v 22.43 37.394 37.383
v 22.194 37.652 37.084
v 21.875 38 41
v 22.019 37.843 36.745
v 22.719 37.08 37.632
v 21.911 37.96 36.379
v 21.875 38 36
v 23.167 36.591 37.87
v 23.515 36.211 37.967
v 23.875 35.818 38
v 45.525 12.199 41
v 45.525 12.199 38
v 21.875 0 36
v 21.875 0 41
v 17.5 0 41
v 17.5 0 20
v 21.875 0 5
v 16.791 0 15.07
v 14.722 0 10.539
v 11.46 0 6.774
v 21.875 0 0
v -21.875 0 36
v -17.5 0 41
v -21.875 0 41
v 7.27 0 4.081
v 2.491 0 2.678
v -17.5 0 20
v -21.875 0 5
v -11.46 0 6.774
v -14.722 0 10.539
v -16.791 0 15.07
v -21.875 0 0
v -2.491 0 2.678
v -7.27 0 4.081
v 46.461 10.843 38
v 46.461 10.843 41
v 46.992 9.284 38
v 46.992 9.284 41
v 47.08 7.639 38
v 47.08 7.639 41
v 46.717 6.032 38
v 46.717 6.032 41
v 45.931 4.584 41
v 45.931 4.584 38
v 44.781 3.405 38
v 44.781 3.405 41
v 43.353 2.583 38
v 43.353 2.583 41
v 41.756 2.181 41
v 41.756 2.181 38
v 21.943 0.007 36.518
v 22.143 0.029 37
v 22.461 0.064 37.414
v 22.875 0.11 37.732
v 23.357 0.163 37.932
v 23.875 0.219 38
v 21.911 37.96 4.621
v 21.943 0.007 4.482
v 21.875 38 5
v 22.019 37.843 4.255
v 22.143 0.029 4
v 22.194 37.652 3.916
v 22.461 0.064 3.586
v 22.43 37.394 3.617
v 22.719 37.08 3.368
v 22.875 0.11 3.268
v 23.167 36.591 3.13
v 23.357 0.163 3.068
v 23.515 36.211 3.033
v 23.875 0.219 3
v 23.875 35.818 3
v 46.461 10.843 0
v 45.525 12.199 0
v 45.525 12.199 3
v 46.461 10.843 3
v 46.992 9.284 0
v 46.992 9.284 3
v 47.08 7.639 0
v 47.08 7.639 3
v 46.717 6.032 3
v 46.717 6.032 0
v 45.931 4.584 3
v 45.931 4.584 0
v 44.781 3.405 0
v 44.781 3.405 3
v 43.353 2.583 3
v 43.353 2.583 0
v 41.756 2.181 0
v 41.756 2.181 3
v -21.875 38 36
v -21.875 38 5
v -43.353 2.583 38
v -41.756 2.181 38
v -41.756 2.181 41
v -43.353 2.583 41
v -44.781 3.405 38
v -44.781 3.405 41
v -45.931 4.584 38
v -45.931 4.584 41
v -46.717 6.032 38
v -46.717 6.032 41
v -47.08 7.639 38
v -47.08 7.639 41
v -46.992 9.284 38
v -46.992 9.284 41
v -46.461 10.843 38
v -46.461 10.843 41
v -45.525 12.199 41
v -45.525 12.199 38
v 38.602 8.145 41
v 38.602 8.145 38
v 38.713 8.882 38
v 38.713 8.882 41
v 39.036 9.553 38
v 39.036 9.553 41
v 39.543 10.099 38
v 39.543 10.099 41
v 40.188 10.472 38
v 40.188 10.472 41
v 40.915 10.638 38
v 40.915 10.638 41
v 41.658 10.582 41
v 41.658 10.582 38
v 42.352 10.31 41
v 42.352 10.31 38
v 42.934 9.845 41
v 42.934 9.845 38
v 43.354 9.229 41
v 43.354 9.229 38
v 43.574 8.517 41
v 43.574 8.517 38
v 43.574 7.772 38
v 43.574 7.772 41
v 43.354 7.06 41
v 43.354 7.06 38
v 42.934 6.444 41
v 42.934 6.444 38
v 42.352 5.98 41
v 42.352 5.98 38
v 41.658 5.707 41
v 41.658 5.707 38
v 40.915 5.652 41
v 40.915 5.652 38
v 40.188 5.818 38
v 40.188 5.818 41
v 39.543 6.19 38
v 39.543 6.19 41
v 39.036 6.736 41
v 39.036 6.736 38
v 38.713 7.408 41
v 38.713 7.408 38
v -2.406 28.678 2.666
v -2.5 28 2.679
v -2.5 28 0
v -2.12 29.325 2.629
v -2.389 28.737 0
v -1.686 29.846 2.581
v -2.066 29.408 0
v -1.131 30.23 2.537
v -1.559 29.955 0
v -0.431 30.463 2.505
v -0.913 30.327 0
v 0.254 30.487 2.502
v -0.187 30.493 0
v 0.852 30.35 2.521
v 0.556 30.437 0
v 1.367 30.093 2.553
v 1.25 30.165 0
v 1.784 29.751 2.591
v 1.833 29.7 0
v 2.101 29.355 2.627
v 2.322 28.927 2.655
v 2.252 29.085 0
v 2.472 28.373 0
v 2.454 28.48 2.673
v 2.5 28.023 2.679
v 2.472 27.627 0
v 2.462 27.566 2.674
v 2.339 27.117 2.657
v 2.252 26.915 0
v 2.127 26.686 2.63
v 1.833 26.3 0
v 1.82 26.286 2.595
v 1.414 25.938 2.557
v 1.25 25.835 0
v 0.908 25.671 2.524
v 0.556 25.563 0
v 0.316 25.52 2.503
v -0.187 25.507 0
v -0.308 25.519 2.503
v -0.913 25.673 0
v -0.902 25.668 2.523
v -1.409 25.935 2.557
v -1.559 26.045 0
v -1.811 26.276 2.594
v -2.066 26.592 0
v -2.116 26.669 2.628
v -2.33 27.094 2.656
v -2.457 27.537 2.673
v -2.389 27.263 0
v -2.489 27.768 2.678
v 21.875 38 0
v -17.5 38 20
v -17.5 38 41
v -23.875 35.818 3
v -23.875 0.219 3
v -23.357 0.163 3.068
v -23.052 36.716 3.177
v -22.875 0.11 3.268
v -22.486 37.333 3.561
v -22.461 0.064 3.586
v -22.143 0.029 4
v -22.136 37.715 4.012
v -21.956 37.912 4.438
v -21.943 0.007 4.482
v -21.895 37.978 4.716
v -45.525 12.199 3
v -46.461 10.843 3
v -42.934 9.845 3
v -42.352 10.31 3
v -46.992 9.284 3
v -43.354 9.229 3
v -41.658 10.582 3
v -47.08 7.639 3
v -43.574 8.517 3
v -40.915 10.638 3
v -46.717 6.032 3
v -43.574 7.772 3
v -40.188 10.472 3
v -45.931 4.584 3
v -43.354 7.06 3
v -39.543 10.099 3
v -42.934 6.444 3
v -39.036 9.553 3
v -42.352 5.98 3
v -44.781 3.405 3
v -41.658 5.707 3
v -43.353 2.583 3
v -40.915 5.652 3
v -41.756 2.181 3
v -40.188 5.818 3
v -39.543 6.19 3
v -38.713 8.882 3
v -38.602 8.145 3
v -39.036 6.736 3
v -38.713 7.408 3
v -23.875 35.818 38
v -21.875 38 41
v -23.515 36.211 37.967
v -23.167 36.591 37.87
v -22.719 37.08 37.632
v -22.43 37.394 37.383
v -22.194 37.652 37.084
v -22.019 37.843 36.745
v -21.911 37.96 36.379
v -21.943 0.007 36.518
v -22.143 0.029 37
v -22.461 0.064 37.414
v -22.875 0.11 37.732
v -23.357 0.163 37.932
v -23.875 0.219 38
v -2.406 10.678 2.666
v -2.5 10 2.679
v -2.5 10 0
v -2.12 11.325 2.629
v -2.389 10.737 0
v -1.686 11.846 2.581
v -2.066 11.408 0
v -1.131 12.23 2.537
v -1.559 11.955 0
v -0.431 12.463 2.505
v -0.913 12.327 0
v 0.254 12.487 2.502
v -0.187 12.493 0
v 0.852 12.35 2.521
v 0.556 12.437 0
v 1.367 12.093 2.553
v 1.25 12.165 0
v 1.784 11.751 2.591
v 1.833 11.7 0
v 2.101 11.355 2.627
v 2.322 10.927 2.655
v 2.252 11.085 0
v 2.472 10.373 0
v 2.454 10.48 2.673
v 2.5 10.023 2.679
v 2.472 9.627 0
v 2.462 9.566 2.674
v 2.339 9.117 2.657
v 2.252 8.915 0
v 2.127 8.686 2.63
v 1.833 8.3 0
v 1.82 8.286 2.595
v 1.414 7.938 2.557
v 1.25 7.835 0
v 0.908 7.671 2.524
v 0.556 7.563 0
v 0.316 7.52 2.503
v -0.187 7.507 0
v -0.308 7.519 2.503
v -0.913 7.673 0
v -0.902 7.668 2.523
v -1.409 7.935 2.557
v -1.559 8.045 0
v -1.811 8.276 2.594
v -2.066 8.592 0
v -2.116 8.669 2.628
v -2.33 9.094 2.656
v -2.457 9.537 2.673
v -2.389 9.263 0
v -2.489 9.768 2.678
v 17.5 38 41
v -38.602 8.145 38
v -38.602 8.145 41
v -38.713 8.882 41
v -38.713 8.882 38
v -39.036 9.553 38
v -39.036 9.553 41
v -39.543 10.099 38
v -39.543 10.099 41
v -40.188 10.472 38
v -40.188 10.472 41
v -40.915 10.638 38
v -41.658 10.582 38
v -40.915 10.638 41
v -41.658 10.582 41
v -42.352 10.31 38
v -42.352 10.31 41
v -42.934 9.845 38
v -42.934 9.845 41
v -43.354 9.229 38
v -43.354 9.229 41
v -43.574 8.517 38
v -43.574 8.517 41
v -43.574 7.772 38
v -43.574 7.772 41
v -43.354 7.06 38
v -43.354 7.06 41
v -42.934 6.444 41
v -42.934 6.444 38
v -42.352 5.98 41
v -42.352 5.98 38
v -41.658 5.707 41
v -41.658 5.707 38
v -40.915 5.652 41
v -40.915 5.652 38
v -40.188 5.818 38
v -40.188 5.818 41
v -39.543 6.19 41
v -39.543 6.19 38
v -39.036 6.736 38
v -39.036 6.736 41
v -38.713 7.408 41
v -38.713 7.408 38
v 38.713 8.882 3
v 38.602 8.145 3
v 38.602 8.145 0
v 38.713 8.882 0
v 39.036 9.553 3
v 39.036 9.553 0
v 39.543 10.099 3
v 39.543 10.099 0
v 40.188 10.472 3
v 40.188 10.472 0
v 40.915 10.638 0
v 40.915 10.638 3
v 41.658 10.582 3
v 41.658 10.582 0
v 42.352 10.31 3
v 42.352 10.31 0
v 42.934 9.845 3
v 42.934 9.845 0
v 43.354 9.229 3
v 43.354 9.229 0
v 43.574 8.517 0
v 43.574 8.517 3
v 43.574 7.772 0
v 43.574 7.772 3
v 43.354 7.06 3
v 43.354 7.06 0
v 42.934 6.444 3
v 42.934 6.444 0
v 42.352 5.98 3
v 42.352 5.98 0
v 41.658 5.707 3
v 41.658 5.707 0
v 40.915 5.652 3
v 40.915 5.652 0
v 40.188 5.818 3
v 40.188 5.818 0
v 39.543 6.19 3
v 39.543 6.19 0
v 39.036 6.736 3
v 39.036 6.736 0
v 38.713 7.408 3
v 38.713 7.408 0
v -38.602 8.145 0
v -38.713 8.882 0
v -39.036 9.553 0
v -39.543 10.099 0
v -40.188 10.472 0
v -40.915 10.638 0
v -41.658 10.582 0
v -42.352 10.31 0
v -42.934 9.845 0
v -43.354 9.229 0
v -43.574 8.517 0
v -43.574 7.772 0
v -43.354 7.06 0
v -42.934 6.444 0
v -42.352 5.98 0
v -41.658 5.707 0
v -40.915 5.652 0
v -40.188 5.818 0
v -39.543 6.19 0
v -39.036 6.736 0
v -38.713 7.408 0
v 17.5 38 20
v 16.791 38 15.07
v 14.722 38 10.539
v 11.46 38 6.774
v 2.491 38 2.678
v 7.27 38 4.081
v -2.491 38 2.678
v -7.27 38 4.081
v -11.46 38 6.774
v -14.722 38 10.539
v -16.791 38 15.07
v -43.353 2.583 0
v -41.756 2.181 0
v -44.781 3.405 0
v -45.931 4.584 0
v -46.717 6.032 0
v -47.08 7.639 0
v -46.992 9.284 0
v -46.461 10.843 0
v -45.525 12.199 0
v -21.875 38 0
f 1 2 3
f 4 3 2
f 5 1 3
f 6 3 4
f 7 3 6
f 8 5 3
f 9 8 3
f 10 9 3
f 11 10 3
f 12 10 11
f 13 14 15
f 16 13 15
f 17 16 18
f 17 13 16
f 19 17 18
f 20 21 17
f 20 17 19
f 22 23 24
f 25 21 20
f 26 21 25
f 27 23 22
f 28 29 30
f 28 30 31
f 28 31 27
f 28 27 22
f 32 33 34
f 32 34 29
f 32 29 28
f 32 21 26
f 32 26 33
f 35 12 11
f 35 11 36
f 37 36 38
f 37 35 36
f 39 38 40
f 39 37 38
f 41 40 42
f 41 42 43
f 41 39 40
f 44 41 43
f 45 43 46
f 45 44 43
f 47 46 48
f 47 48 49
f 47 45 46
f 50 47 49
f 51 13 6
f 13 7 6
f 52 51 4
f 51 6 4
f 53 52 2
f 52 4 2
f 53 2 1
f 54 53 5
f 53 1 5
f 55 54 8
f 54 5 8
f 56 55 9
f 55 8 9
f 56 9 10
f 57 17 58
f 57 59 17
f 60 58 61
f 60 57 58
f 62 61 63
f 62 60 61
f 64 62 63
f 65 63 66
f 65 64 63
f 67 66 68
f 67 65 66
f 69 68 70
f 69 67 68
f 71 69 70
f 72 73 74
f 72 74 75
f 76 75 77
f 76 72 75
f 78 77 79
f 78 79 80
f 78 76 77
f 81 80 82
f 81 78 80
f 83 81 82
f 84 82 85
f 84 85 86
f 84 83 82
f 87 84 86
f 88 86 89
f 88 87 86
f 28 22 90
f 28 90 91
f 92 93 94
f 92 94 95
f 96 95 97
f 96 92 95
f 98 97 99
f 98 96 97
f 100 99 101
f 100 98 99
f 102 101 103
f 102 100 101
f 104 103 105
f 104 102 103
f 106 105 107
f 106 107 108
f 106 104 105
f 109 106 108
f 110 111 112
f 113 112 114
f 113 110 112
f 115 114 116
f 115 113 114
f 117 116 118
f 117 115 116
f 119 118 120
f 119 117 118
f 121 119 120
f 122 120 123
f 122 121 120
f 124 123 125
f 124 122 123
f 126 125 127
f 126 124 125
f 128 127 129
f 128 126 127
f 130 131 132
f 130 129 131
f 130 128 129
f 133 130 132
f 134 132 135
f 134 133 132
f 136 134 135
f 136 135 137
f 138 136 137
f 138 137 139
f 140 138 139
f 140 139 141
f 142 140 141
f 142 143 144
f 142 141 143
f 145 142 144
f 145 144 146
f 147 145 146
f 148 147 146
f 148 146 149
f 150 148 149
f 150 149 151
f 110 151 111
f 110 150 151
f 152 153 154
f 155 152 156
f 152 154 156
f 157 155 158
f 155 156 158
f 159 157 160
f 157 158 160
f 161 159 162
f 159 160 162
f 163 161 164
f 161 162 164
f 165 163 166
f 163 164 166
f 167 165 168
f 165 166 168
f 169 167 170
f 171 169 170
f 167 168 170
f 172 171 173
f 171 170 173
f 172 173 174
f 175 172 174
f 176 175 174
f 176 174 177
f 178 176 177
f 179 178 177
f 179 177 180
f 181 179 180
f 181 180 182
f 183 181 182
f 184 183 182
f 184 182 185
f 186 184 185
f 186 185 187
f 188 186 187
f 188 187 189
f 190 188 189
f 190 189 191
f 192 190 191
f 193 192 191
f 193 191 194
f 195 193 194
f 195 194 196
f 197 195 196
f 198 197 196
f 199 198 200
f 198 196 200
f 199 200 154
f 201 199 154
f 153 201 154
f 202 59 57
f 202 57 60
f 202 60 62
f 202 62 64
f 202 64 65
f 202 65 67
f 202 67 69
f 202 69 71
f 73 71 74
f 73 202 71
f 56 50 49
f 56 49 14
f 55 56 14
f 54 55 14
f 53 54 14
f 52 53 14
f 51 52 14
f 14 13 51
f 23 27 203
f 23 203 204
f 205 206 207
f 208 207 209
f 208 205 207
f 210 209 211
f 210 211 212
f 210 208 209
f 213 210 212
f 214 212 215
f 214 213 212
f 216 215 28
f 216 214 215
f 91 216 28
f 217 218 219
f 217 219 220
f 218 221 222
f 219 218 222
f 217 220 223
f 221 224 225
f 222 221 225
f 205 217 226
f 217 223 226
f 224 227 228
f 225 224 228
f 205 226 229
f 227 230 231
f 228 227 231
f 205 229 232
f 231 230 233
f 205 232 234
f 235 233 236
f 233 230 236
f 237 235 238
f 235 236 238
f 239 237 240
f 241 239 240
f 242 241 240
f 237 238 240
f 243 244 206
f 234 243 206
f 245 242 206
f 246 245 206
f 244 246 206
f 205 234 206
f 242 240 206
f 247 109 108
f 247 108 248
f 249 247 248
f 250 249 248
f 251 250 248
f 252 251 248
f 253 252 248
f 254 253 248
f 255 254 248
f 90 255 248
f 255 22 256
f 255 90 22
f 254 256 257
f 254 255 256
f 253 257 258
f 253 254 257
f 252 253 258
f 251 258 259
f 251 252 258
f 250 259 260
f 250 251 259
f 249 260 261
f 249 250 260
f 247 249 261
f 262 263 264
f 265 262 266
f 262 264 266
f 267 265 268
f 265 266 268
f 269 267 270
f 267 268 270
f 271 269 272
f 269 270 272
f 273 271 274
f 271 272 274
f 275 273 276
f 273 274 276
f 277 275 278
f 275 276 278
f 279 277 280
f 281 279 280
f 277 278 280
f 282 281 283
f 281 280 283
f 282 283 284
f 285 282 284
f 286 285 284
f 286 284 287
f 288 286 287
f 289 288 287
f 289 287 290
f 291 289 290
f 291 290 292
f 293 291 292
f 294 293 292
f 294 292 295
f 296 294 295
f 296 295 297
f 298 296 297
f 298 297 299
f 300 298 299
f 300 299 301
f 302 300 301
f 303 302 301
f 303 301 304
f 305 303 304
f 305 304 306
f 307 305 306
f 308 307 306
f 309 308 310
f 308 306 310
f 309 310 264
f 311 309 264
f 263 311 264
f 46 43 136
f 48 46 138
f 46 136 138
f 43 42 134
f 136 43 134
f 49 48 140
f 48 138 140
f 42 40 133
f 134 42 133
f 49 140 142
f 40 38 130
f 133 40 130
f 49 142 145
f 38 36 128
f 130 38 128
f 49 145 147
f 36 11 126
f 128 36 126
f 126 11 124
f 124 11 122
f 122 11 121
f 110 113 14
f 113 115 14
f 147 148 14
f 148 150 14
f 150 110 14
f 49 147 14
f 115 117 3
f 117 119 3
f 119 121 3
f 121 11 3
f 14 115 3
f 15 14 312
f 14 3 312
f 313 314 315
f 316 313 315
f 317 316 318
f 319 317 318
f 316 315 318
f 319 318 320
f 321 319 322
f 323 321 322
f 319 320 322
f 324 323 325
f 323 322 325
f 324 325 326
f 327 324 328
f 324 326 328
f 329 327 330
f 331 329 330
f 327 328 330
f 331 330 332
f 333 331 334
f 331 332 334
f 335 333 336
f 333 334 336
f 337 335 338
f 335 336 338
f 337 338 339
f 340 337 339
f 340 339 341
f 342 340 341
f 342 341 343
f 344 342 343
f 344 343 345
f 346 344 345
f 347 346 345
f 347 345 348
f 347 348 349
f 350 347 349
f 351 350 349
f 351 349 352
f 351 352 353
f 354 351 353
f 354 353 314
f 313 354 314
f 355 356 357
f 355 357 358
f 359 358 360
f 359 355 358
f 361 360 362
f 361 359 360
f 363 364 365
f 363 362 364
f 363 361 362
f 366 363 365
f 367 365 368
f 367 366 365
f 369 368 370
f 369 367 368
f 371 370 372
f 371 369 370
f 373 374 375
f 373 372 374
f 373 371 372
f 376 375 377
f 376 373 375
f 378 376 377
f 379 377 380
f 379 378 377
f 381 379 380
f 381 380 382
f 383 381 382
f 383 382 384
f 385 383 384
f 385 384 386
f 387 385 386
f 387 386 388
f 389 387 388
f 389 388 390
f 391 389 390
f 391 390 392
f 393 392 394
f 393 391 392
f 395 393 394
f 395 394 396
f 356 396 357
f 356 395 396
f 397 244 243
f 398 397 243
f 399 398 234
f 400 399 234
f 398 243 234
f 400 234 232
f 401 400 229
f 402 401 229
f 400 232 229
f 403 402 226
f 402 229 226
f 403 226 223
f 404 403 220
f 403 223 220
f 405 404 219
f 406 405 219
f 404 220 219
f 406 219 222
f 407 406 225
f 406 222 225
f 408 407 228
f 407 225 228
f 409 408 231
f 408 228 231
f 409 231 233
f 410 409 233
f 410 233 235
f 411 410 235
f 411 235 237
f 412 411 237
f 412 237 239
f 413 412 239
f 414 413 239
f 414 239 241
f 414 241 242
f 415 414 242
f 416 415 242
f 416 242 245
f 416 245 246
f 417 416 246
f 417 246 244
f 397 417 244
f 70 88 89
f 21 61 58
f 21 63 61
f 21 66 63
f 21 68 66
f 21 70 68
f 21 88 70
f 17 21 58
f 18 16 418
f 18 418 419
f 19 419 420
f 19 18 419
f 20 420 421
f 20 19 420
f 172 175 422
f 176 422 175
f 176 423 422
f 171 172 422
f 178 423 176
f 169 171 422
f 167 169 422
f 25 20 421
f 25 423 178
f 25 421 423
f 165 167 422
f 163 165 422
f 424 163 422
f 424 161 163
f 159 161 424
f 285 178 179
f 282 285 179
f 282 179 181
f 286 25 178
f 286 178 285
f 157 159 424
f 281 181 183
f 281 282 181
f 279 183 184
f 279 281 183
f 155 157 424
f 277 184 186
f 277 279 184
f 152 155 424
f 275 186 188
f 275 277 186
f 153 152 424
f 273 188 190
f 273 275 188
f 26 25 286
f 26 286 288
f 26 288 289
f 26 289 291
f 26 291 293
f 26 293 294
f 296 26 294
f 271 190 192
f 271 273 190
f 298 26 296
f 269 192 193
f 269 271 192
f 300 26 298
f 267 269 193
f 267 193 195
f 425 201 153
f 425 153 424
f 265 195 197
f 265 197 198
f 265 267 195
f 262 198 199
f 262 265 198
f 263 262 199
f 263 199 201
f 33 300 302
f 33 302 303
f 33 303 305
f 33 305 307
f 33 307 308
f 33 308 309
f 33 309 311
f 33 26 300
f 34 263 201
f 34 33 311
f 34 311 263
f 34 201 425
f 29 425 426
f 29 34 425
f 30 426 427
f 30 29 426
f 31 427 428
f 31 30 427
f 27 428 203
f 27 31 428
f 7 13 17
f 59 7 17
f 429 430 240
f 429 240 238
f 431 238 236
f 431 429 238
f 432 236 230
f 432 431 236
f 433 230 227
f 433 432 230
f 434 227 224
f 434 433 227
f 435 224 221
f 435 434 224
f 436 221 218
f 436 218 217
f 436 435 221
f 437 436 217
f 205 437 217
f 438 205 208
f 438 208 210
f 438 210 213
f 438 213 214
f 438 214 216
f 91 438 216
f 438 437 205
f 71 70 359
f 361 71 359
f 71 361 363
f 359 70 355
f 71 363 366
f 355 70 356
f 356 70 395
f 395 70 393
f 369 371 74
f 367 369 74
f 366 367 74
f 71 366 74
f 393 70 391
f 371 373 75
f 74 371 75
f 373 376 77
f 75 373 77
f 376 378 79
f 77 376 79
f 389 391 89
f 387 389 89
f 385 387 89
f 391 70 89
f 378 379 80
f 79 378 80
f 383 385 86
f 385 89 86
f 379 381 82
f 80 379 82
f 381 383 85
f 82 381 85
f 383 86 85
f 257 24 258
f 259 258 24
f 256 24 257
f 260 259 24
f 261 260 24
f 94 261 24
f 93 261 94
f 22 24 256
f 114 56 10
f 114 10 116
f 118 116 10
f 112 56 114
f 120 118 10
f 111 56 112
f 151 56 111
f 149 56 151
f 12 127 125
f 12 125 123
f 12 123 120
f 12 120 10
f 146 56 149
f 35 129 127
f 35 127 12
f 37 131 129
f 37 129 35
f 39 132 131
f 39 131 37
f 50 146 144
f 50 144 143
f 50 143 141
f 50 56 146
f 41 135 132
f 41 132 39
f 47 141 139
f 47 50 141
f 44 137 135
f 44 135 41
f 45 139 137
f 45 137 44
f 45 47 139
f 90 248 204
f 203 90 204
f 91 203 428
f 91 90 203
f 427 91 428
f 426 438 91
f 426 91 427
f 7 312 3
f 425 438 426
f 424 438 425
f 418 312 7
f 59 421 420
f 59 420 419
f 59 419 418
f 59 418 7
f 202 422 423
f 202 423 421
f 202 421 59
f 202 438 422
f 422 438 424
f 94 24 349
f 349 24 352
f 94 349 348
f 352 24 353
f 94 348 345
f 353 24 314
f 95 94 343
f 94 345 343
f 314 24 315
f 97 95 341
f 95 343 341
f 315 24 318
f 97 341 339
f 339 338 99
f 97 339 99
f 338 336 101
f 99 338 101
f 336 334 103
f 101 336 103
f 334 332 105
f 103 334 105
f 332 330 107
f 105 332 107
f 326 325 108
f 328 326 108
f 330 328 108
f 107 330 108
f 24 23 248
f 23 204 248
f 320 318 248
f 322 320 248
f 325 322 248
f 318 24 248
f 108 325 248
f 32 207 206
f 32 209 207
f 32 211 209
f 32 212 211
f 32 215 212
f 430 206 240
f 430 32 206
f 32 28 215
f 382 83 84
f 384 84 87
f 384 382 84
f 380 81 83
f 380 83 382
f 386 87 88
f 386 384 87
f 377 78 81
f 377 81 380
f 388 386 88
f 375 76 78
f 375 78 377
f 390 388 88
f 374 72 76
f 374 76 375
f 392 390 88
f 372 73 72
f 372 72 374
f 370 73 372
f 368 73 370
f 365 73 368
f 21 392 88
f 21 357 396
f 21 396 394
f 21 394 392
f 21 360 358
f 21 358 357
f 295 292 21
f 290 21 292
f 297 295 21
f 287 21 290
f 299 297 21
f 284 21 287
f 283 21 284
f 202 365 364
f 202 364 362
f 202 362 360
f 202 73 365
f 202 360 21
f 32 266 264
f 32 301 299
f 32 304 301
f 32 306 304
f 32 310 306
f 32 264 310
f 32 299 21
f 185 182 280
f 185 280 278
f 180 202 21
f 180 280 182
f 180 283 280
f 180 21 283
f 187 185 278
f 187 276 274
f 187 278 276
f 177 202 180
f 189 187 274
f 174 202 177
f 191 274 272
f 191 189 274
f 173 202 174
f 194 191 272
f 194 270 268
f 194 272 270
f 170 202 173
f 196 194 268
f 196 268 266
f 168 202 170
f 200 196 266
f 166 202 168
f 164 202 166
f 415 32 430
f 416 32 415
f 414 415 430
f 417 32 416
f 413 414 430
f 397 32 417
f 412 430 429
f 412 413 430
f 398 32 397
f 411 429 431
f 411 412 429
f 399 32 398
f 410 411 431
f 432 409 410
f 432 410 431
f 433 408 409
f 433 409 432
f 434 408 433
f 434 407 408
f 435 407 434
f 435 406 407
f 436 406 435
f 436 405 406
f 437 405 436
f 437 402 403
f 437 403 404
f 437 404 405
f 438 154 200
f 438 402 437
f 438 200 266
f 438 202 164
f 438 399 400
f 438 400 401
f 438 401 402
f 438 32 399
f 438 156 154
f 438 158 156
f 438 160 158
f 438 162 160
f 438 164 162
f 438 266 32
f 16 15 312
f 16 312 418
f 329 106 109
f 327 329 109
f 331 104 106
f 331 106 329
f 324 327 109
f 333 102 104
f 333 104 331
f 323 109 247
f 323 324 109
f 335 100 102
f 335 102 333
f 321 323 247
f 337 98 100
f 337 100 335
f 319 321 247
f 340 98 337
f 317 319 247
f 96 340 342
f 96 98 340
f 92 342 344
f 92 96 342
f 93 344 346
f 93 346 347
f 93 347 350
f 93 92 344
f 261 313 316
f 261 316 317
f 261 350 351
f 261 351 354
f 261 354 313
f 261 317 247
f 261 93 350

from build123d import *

# Parameters (mm, degrees)
BOSS_EXTRUDE1_DEPTH     = 41
SKETCH3_W               = 25.226628976
SKETCH3_H               = 35
CUT_EXTRUDE2_DEPTH      = 39
CUT_EXTRUDE2_DEPTH_BACK = 1
CUT_EXTRUDE3_DEPTH      = 39
SKETCH5_R               = 2.5
CUT_EXTRUDE4_DEPTH      = 42
SKETCH6_R               = 2.5
CUT_EXTRUDE5_DEPTH      = 42.0000001
FILLET1_R               = 2


with BuildPart() as part:
    # Sketch1 → Boss-Extrude1 (new body)
    with BuildSketch(Plane.XY):
        with BuildLine():
            Line((-21.875, 0), (-41.755779843, 2.180502889))
            ThreePointArc((-41.755779843, 2.180502889), (-46.717396797, 6.03211956), (-45.524663567, 12.198964882))
            Line((-45.524663567, 12.198964882), (-21.875, 38))
            Line((-21.875, 38), (21.875, 38))
            Line((21.875, 38), (45.524663567, 12.198964882))
            ThreePointArc((45.524663567, 12.198964882), (46.717396797, 6.03211956), (41.755779843, 2.180502889))
            Line((41.755779843, 2.180502889), (21.875, 0))
            Line((21.875, 0), (-21.875, 0))
        make_face()
    extrude(amount=BOSS_EXTRUDE1_DEPTH)

    # Sketch3 → Cut-Extrude2 (cut, two sides)
    with BuildSketch(Plane(origin=(0, 0, 0), x_dir=(1, 0, 0), z_dir=(0, 1, 0))) as cut_extrude2_sk:
        with Locations((34.488314488, -20.5)):
            Rectangle(SKETCH3_W, SKETCH3_H)
        with Locations((-34.488314488, -20.5)):
            Rectangle(SKETCH3_W, SKETCH3_H)
    extrude(amount=CUT_EXTRUDE2_DEPTH, mode=Mode.SUBTRACT)
    extrude(cut_extrude2_sk.sketch, amount=-CUT_EXTRUDE2_DEPTH_BACK, mode=Mode.SUBTRACT)

    # Sketch4 → Cut-Extrude3 (cut, through all)
    with BuildSketch(Plane.XZ):
        with BuildLine():
            Line((-17.5, 20), (-17.5, 41))
            Line((-17.5, 41), (17.5, 41))
            Line((17.5, 41), (17.5, 20))
            ThreePointArc((17.5, 20), (0, 2.5), (-17.5, 20))
        make_face()
    extrude(amount=-CUT_EXTRUDE3_DEPTH, mode=Mode.SUBTRACT)

    # Sketch5 → Cut-Extrude4 (cut, through all)
    with BuildSketch(Plane(origin=(0, 0, 0), x_dir=(-1, 0, 0), z_dir=(0, 0, -1))):
        with Locations((0, 28)):
            Circle(SKETCH5_R)
        with Locations((0, 10)):
            Circle(SKETCH5_R)
    extrude(amount=-CUT_EXTRUDE4_DEPTH, mode=Mode.SUBTRACT)

    # Sketch6 → Cut-Extrude5 (cut, through all)
    with BuildSketch(Plane.XY.offset(41)):
        with Locations((-41.101628976, 8.144736842)):
            Circle(SKETCH6_R)
    cut_extrude5 = extrude(amount=-CUT_EXTRUDE5_DEPTH, mode=Mode.SUBTRACT)

    # Mirror1: Cut-Extrude5 across plane
    add(cut_extrude5.mirror(Plane(origin=(0, 0, 0), x_dir=(0, 0, 1), z_dir=(1, 0, 0))), mode=Mode.SUBTRACT)

    # Fillet1
    fillet1_edges = [part.edges().sort_by_distance(p)[0] for p in [
        (21.875, 19, 3),
        (21.875, 19, 38),
        (-21.875, 19, 38),
        (-21.875, 19, 3),
    ]]
    fillet(fillet1_edges, radius=FILLET1_R)


solid = part.part
